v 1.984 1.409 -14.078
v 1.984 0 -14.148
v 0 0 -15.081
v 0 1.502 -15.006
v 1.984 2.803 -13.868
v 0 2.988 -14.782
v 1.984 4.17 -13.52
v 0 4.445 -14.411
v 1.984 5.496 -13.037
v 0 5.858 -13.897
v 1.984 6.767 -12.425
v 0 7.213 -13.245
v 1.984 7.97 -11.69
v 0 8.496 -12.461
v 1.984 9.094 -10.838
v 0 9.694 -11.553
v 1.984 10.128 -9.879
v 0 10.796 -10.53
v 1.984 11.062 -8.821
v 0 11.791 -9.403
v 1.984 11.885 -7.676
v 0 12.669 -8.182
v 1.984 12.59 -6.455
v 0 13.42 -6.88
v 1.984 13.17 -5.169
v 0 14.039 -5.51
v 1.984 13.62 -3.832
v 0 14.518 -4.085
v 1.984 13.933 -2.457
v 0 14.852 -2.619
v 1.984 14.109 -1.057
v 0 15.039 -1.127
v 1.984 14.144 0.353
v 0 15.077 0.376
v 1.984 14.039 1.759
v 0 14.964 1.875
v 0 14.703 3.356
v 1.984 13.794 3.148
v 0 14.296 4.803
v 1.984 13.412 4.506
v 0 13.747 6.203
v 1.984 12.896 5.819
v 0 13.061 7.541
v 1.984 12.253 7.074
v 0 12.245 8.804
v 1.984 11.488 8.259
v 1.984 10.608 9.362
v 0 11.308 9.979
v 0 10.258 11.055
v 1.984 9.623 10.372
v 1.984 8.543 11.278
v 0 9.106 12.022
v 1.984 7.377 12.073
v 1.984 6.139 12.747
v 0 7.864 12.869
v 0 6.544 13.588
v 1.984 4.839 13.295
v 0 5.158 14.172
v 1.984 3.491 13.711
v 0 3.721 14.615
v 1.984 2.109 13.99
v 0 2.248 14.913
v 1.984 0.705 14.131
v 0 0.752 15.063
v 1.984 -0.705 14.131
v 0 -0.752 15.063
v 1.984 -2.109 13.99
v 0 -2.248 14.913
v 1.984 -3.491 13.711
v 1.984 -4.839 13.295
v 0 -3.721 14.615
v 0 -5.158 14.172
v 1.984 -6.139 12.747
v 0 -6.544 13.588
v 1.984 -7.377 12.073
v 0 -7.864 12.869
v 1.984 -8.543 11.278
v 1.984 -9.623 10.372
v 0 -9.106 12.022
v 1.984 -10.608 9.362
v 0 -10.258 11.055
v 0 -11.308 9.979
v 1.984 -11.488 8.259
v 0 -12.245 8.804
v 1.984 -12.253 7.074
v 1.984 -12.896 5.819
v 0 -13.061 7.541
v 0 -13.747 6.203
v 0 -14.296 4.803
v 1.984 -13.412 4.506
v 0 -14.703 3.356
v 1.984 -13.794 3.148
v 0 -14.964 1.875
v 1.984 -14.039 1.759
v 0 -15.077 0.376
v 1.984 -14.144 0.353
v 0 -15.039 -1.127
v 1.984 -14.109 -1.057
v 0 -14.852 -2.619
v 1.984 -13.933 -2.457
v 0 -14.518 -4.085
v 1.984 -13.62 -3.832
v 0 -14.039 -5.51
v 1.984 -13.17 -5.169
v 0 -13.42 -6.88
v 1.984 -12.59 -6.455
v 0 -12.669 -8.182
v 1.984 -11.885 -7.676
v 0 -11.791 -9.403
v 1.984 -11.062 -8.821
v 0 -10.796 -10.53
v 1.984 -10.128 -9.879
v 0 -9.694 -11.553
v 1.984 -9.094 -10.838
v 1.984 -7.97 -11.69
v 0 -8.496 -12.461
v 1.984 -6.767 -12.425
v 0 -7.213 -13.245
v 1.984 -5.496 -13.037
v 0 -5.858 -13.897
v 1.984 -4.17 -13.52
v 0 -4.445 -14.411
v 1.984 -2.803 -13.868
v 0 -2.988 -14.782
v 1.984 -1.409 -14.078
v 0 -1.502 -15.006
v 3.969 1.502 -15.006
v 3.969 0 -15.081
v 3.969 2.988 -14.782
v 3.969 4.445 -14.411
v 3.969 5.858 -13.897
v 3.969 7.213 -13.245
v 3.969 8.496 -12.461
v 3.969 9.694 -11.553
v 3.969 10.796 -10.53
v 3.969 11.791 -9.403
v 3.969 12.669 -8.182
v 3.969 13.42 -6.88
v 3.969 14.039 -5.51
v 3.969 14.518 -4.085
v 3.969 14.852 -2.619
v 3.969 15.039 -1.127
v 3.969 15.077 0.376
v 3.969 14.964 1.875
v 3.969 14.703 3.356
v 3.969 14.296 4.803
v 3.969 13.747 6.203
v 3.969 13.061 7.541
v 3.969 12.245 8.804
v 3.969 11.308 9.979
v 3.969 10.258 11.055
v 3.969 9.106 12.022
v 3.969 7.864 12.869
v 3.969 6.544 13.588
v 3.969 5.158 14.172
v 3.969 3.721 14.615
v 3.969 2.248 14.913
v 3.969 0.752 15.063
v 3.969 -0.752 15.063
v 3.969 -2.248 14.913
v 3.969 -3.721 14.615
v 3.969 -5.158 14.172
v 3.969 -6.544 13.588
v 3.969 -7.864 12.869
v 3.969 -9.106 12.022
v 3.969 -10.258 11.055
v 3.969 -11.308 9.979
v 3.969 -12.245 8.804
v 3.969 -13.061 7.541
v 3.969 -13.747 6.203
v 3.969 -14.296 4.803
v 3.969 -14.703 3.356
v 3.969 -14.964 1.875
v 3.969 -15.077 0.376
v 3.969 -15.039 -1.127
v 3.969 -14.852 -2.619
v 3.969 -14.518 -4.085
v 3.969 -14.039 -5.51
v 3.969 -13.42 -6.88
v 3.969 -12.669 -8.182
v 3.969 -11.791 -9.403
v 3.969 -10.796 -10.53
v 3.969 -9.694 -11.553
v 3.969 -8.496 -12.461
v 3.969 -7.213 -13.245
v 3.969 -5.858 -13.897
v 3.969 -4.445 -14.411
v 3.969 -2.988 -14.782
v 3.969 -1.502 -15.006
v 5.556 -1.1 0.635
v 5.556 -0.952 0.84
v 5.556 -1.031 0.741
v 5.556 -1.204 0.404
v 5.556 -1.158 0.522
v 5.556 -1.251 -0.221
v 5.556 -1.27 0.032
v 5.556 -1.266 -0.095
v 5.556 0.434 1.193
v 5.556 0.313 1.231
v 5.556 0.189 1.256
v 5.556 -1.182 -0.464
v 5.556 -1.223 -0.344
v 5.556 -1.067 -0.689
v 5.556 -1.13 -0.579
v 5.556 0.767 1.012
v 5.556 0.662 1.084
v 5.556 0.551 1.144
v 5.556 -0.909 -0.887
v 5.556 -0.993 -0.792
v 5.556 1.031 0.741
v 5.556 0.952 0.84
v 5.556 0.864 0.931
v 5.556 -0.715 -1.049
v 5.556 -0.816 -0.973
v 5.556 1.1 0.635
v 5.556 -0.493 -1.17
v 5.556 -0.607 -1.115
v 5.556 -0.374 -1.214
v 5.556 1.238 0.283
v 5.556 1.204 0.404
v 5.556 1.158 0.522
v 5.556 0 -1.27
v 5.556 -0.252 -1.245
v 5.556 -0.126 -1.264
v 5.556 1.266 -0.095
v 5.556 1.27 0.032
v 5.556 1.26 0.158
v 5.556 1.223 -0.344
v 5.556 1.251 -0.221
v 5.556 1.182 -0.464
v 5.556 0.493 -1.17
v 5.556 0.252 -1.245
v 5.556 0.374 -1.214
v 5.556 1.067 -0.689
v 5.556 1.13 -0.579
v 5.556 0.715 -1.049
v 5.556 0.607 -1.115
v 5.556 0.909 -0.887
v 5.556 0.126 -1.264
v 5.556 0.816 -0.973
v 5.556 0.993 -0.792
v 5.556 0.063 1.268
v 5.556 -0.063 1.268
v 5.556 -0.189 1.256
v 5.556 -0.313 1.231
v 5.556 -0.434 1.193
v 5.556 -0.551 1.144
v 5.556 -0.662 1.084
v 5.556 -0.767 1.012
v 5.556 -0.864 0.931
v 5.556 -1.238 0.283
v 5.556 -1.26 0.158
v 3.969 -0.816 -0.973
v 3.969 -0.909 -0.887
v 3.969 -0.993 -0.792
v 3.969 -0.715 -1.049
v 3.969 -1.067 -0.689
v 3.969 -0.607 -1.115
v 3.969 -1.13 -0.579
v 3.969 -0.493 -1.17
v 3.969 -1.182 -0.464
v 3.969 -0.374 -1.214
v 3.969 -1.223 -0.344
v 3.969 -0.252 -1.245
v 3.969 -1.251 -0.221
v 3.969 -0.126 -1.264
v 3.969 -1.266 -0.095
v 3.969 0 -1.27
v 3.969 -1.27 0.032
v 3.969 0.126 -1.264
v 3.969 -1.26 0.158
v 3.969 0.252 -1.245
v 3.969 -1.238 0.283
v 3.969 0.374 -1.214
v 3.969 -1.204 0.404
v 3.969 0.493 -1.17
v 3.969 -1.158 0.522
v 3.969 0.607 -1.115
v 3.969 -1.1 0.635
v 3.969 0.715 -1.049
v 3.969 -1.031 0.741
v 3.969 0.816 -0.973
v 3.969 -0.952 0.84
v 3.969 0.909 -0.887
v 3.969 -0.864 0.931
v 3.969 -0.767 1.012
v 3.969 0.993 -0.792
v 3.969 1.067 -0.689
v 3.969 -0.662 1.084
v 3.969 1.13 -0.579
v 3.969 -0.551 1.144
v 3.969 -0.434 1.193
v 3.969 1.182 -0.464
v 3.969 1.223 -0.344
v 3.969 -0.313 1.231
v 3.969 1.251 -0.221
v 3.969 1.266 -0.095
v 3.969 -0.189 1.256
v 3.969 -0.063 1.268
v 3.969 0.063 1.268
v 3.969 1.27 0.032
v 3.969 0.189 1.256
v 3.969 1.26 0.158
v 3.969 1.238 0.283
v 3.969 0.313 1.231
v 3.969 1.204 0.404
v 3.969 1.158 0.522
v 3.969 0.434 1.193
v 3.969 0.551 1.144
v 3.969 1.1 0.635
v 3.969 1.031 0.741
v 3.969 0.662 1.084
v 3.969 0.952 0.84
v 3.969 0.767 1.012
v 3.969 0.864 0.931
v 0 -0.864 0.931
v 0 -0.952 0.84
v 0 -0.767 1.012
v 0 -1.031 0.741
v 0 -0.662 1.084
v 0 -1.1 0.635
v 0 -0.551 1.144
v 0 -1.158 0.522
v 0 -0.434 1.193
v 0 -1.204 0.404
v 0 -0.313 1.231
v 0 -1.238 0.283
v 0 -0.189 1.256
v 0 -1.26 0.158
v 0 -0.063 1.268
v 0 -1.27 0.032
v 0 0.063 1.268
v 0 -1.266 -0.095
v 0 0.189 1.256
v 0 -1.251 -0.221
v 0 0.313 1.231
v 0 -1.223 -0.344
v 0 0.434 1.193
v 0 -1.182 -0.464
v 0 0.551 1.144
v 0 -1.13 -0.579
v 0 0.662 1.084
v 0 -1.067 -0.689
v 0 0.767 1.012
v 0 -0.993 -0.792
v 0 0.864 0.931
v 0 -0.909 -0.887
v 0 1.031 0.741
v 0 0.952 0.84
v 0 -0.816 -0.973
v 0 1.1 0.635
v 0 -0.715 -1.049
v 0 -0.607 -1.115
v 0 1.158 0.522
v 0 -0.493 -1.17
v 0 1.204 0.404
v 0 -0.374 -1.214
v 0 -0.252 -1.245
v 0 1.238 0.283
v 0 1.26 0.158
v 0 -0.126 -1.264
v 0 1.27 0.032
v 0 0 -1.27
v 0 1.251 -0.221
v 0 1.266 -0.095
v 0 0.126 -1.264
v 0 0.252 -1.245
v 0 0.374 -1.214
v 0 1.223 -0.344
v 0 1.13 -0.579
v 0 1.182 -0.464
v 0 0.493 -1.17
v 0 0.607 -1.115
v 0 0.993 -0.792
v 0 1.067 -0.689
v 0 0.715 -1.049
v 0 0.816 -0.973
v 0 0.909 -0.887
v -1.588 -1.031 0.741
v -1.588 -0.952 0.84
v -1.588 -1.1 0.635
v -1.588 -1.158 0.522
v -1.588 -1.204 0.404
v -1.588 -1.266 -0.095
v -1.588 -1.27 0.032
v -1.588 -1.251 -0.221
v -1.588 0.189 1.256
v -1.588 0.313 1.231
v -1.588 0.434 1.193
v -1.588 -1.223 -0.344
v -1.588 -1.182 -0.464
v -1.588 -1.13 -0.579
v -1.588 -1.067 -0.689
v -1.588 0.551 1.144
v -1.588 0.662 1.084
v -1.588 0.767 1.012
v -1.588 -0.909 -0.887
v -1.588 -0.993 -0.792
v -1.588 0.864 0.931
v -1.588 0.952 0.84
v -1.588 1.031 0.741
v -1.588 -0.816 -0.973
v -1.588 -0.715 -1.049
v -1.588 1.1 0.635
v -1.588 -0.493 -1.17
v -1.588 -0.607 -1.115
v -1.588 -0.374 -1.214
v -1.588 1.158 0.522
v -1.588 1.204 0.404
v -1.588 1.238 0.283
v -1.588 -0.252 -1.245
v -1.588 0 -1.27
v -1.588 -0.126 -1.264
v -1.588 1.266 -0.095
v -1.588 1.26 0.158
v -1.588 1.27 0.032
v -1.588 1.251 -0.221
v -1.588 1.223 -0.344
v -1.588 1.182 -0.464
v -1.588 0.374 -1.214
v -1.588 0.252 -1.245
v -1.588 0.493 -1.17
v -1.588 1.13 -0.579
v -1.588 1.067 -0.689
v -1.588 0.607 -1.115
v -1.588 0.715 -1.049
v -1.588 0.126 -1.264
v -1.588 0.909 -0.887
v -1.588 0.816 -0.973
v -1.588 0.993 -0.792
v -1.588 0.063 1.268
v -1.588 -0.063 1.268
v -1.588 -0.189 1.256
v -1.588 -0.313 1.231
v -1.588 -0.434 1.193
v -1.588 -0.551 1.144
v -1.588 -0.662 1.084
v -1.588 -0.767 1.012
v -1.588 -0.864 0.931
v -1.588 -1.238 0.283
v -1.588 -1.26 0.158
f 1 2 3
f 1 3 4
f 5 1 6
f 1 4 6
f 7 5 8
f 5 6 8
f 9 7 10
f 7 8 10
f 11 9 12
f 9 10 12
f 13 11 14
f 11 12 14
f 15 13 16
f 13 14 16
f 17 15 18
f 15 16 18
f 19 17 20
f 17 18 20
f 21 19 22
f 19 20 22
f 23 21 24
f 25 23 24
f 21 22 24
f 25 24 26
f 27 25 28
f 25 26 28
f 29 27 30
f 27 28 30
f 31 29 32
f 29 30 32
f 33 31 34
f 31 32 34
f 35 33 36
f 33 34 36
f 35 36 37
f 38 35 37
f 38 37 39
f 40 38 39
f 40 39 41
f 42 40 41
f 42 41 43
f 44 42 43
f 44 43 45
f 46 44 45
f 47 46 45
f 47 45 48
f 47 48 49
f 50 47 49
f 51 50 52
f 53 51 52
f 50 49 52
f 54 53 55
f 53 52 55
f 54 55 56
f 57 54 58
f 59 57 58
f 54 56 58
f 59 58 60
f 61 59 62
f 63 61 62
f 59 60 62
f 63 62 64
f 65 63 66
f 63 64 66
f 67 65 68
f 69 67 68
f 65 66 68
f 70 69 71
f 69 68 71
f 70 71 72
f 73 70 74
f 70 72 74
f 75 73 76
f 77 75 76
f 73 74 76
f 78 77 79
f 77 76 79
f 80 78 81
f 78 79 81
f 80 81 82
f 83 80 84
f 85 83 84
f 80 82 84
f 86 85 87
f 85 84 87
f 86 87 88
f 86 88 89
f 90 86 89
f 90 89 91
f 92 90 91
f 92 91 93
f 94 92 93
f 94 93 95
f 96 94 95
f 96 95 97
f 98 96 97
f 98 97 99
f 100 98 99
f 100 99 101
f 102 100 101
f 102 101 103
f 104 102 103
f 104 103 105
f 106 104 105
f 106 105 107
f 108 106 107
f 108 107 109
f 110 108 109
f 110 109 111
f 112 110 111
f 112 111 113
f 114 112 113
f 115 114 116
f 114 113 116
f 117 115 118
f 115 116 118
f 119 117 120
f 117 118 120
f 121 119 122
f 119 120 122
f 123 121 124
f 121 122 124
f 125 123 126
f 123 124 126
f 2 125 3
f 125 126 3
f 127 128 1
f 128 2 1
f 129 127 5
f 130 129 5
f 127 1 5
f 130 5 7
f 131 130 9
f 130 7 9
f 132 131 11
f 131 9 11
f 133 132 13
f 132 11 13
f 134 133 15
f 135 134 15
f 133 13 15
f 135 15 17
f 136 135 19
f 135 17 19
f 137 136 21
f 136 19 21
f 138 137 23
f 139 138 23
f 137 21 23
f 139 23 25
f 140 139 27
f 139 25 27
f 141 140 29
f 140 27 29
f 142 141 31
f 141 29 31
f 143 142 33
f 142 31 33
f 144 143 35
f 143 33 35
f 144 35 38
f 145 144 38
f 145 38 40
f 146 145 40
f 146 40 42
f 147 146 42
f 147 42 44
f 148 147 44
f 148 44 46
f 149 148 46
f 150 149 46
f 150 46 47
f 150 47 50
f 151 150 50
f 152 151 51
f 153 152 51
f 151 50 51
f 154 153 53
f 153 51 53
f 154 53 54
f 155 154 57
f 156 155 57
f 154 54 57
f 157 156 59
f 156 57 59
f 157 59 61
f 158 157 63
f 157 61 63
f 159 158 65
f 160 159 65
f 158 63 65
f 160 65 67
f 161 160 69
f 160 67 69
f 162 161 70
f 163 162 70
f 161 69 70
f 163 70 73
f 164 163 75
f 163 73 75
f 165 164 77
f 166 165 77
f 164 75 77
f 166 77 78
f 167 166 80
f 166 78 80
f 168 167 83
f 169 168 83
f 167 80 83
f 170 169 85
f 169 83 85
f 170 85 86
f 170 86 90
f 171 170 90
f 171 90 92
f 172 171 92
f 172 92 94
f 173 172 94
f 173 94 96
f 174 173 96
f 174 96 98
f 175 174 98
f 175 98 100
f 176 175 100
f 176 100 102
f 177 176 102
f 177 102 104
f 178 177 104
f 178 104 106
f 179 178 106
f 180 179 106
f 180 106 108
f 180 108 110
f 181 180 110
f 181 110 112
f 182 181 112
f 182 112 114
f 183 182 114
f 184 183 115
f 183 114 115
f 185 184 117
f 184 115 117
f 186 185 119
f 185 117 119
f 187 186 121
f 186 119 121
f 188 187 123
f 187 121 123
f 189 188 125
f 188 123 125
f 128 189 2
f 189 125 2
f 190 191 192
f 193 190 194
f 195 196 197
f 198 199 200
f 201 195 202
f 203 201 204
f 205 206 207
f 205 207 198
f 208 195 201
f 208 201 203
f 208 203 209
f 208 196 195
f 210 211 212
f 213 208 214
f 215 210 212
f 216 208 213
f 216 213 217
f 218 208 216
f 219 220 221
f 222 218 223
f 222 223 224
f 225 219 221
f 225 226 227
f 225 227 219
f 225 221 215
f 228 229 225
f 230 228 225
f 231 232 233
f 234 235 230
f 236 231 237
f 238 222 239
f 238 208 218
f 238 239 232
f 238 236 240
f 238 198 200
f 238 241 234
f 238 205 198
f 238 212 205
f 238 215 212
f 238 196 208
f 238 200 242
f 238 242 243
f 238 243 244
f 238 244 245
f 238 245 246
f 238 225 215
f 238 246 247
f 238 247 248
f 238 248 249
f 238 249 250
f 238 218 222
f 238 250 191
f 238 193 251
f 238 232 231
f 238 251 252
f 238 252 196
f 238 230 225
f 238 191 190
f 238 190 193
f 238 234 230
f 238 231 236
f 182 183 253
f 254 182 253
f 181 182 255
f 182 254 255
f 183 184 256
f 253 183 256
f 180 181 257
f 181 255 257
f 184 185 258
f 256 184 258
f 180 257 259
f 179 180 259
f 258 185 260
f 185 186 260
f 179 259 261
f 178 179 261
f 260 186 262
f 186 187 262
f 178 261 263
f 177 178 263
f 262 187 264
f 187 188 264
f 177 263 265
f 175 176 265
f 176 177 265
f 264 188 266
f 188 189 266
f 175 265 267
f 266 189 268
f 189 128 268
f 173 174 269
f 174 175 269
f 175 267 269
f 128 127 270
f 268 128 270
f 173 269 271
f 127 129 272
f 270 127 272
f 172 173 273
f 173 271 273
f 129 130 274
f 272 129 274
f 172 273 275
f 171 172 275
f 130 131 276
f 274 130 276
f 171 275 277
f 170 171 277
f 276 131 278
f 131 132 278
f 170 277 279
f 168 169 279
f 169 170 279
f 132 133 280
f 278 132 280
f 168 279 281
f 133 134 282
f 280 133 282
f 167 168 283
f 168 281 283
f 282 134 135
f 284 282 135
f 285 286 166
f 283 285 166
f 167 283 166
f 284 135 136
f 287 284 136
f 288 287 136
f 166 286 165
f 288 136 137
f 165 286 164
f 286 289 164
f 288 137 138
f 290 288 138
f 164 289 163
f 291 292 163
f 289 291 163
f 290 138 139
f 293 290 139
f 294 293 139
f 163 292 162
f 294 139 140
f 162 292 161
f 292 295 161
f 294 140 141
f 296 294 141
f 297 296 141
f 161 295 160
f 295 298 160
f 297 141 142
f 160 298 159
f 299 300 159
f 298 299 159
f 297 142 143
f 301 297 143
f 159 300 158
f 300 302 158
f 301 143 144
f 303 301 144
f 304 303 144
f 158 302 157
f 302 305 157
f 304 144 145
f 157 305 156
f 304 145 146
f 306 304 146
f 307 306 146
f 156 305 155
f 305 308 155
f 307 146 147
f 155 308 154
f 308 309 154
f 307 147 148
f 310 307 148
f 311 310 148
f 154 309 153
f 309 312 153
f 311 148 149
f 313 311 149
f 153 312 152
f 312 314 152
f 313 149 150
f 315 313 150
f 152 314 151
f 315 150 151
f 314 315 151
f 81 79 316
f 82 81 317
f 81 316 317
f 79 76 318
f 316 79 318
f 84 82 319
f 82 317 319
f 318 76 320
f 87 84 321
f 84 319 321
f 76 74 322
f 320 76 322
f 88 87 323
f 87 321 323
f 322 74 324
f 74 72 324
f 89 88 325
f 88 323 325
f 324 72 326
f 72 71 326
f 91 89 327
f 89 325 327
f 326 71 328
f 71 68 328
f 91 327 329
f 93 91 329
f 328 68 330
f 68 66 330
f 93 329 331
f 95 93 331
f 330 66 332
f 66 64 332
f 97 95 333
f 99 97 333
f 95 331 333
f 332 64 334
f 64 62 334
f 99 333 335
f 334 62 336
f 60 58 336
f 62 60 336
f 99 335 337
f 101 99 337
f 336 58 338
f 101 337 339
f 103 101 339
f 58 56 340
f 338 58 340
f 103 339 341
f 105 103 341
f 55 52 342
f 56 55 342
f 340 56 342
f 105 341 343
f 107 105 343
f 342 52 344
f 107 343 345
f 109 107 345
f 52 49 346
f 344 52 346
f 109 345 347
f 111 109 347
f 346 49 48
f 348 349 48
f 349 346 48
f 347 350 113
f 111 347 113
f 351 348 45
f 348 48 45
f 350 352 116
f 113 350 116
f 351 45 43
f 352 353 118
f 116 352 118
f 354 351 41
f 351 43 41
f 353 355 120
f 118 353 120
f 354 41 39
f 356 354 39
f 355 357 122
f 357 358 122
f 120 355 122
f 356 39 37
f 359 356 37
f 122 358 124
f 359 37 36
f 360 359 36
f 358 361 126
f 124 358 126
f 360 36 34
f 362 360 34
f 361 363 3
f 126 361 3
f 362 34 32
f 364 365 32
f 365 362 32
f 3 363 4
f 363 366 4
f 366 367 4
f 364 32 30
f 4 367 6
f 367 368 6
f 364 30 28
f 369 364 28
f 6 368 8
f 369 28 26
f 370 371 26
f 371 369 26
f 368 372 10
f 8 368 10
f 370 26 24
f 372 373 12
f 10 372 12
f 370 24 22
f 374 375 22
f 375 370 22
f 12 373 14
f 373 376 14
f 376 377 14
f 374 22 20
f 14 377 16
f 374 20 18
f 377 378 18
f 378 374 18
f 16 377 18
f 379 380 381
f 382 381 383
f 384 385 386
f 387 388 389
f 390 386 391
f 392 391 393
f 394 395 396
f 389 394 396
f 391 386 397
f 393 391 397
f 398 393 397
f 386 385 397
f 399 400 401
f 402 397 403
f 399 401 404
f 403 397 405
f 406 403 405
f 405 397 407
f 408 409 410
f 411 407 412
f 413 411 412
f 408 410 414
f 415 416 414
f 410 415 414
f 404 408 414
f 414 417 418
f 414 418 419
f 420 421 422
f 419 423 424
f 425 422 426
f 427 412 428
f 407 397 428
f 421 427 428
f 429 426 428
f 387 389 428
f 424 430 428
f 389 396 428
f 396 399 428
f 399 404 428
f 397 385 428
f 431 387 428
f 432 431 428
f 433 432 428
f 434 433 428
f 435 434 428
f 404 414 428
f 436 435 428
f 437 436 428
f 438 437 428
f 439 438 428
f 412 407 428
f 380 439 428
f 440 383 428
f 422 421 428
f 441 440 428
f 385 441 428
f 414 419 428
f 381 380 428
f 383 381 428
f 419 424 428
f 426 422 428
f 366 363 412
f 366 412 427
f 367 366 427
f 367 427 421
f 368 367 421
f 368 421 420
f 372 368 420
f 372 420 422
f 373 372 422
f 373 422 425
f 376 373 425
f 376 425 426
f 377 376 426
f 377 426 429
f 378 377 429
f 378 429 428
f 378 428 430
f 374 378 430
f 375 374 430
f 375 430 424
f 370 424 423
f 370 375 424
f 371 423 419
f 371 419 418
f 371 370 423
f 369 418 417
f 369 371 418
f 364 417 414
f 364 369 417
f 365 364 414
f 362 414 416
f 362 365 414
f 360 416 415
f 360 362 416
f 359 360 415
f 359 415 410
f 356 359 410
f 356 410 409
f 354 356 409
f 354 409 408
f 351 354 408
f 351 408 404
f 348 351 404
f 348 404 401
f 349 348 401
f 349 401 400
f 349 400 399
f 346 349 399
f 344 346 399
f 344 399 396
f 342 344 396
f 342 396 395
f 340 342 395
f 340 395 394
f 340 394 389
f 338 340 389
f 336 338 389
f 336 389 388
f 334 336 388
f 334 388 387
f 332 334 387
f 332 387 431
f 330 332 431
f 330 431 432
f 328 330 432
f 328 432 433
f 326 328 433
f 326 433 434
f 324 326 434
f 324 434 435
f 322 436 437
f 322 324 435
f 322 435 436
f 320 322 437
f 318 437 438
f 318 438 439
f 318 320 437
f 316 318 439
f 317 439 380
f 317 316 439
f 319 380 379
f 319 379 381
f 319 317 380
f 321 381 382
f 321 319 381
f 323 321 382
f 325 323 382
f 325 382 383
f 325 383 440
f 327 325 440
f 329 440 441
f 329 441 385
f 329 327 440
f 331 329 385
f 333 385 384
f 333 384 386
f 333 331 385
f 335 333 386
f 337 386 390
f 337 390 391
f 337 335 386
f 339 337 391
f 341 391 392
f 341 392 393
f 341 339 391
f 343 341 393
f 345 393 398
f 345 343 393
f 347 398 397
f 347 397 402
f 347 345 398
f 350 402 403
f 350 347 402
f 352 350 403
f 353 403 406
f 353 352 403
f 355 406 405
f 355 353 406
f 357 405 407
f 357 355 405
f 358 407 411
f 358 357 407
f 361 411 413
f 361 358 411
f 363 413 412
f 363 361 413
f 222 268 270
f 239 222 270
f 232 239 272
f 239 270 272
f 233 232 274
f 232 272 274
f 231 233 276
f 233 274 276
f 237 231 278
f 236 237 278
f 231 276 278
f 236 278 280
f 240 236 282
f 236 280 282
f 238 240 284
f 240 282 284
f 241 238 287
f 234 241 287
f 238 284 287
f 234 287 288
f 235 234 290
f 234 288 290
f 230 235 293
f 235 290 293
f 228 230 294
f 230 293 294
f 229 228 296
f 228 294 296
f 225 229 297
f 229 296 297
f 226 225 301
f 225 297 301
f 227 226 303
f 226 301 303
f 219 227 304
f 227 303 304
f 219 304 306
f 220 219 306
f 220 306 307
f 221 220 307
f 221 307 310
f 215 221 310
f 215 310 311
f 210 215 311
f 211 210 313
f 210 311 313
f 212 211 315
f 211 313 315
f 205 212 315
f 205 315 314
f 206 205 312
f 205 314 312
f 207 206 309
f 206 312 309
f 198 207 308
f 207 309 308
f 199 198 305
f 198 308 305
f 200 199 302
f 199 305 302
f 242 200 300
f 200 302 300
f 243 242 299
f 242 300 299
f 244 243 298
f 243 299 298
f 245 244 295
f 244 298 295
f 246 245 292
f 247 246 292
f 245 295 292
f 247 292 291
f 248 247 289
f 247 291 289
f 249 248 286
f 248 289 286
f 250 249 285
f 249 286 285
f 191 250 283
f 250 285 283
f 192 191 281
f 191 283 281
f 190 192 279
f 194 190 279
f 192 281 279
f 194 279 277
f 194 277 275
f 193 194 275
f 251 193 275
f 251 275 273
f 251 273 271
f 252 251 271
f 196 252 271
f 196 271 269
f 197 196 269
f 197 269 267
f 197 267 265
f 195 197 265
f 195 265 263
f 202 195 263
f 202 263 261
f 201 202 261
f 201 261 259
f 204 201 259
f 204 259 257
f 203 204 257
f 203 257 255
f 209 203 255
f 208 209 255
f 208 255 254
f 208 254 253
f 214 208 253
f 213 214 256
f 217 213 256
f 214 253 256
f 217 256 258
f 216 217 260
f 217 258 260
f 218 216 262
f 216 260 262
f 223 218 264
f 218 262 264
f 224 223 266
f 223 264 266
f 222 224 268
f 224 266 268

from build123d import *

# Parameters (mm, degrees)
SKETCH2_R                = 1.27
BOSS_EXTRUDE1_DEPTH      = 1.5875
BOSS_EXTRUDE1_DEPTH_BACK = 5.55625


with BuildPart() as part:
    # Sketch1 → Revolve1 (revolve)
    with BuildSketch(Plane(origin=(0, 0, 0), x_dir=(1, 0, 0), z_dir=(0, 1, 0))):
        Polygon((0, 0), (3.96875, 0), (3.96875, 15.08125), (1.984375, 14.148388583), (0, 15.08125), align=None)
    revolve(axis=Axis((0, 0, 0), (1, 0, 0)))

    # Sketch2 → Boss-Extrude1 (add, two sides)
    with BuildSketch(Plane(origin=(3.96875, 0, 0), x_dir=(0, 0, -1), z_dir=(1, 0, 0))) as boss_extrude1_sk:
        Circle(SKETCH2_R)
    extrude(amount=BOSS_EXTRUDE1_DEPTH)
    extrude(boss_extrude1_sk.sketch, amount=-BOSS_EXTRUDE1_DEPTH_BACK)


solid = part.part
